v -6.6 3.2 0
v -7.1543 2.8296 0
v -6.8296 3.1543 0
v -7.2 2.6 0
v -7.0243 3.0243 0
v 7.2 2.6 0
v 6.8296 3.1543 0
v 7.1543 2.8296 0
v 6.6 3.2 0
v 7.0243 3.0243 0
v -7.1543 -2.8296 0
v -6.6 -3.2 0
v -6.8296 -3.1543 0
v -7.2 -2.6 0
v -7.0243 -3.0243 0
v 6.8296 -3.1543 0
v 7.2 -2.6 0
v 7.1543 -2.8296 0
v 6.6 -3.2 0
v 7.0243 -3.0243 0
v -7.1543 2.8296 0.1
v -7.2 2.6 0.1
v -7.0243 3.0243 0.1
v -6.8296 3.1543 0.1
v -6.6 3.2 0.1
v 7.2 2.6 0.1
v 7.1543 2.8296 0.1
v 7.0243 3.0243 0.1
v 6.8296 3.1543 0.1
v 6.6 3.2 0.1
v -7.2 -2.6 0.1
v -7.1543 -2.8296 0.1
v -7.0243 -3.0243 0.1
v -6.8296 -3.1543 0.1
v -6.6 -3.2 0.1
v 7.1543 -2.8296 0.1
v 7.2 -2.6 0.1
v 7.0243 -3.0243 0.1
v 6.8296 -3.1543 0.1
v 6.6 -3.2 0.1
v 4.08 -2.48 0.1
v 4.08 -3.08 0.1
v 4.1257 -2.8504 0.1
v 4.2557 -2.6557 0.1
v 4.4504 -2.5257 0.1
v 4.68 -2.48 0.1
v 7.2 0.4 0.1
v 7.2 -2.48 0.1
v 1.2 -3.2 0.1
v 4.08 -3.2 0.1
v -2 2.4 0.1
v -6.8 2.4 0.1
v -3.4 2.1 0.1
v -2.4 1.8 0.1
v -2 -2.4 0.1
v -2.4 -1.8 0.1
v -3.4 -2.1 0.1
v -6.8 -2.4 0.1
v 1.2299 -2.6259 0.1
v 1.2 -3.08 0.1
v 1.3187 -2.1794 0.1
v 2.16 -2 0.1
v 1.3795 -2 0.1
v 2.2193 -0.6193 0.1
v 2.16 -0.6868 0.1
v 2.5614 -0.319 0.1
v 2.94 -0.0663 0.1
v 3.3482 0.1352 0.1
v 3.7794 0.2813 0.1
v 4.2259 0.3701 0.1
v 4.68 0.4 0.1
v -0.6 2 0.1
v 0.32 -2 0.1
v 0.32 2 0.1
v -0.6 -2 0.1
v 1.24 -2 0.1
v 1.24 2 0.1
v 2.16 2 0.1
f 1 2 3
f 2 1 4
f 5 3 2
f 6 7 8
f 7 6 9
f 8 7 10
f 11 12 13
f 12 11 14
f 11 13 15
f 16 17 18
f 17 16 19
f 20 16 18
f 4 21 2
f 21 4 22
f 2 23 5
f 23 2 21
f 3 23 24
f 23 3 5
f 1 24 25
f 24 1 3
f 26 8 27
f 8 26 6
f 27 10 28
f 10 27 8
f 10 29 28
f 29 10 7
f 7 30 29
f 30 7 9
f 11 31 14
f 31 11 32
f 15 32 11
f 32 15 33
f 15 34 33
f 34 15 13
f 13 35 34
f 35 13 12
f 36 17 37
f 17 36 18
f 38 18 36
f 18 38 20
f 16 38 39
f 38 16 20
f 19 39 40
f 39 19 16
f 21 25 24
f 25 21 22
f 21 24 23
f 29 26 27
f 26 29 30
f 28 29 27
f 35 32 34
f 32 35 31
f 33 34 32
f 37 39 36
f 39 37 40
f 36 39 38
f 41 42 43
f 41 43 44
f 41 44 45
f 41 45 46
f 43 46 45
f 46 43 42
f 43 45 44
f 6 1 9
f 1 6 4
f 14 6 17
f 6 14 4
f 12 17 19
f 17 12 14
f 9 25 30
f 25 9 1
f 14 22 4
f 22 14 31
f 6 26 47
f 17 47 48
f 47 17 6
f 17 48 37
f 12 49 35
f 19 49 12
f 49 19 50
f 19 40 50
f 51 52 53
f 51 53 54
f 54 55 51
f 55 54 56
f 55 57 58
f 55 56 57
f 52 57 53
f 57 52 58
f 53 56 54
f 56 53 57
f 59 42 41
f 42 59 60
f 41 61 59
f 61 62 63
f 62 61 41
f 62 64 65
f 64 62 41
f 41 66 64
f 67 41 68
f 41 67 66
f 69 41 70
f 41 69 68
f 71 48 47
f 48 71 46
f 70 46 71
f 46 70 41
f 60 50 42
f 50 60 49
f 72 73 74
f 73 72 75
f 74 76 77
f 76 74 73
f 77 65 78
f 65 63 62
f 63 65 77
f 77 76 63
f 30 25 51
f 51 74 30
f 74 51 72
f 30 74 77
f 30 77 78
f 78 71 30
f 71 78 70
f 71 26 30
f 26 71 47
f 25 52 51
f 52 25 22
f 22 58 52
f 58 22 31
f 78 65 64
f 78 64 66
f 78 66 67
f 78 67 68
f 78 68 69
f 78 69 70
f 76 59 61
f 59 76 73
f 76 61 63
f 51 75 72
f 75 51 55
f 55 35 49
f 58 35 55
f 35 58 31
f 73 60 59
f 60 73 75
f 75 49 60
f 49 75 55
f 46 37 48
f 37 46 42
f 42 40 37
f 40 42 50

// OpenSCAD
// file: ../p/1-4ndis.scad
use <../lib.scad>
function ldraw_lib__1_4ndis() = [
// 0 Disc Negative 0.25
// 0 Name: 1-4ndis.dat
// 0 Author: James Jessiman
// 0 !LDRAW_ORG Primitive UPDATE 2012-01
// 0 !LICENSE Licensed under CC BY 4.0 : see CAreadme.txt
// 
// 0 BFC CERTIFY CCW
  [0,"BFC","CERTIFY"],
  [0,"BFC","CCW"],
// 
// 0 !HISTORY 2002-03-23 [sbliss] Added BFC Statement
// 0 !HISTORY 2002-04-25 [PTadmin] Official Update 2002-02
// 0 !HISTORY 2007-06-22 [PTadmin] Header formatted for Contributor Agreement
// 0 !HISTORY 2008-07-01 [PTadmin] Official Update 2008-01
// 0 !HISTORY 2012-02-16 [Philo] Changed to CCW
// 0 !HISTORY 2012-03-30 [PTadmin] Official Update 2012-01
// 
// 
// 3 16 0.9239 0 0.3827 1 0 0 1 0 1
  [3,16,0.9239,0,0.3827,1,0,0,1,0,1],
// 3 16 0.7071 0 0.7071 0.9239 0 0.3827 1 0 1
  [3,16,0.7071,0,0.7071,0.9239,0,0.3827,1,0,1],
// 3 16 0.3827 0 0.9239 0.7071 0 0.7071 1 0 1
  [3,16,0.3827,0,0.9239,0.7071,0,0.7071,1,0,1],
// 3 16 0 0 1 0.3827 0 0.9239 1 0 1
  [3,16,0,0,1,0.3827,0,0.9239,1,0,1],
];
module ldraw_lib__1_4ndis(step=0, col=false, unit=2/5, alt=false, line=0.2, solid=!$preview)
    makepoly(ldraw_lib__1_4ndis(), step=step, col=col, unit=unit, alt=alt, line=line, solid=solid);
ldraw_lib__1_4ndis(line=0.2);
// file: ../p/1-4cyli.scad
use <../lib.scad>
function ldraw_lib__1_4cyli() = [
// 0 Cylinder 0.25
// 0 Name: 1-4cyli.dat
// 0 Author: James Jessiman
// 0 !LDRAW_ORG Primitive UPDATE 2012-01
// 0 !LICENSE Licensed under CC BY 4.0 : see CAreadme.txt
// 
// 0 BFC CERTIFY CCW
  [0,"BFC","CERTIFY"],
  [0,"BFC","CCW"],
// 
// 0 !HISTORY 2002-03-23 [sbliss] Added BFC statement.
// 0 !HISTORY 2002-04-25 [PTadmin] Official Update 2002-02
// 0 !HISTORY 2007-06-22 [PTadmin] Header formatted for Contributor Agreement
// 0 !HISTORY 2008-07-01 [PTadmin] Official Update 2008-01
// 0 !HISTORY 2012-02-16 [Philo] Changed to CCW
// 0 !HISTORY 2012-03-30 [PTadmin] Official Update 2012-01
// 
// 
// 4 16 1 1 0 0.9239 1 0.3827 0.9239 0 0.3827 1 0 0
  [4,16,1,1,0,0.9239,1,0.3827,0.9239,0,0.3827,1,0,0],
// 5 24 1 0 0 1 1 0 0.9239 0 0.3827 1 0 -1
  [5,24,1,0,0,1,1,0,0.9239,0,0.3827,1,0,-1],
// 4 16 0.9239 1 0.3827 0.7071 1 0.7071 0.7071 0 0.7071 0.9239 0 0.3827
  [4,16,0.9239,1,0.3827,0.7071,1,0.7071,0.7071,0,0.7071,0.9239,0,0.3827],
// 5 24 0.9239 0 0.3827 0.9239 1 0.3827 0.7071 0 0.7071 1 0 0
  [5,24,0.9239,0,0.3827,0.9239,1,0.3827,0.7071,0,0.7071,1,0,0],
// 4 16 0.7071 1 0.7071 0.3827 1 0.9239 0.3827 0 0.9239 0.7071 0 0.7071
  [4,16,0.7071,1,0.7071,0.3827,1,0.9239,0.3827,0,0.9239,0.7071,0,0.7071],
// 5 24 0.7071 0 0.7071 0.7071 1 0.7071 0.3827 0 0.9239 0.9239 0 0.3827
  [5,24,0.7071,0,0.7071,0.7071,1,0.7071,0.3827,0,0.9239,0.9239,0,0.3827],
// 4 16 0.3827 1 0.9239 0 1 1 0 0 1 0.3827 0 0.9239
  [4,16,0.3827,1,0.9239,0,1,1,0,0,1,0.3827,0,0.9239],
// 5 24 0.3827 0 0.9239 0.3827 1 0.9239 0 0 1 0.7071 0 0.7071
  [5,24,0.3827,0,0.9239,0.3827,1,0.9239,0,0,1,0.7071,0,0.7071],
// 5 24 0 0 1 0 1 1 0.3827 0 0.9239 -1 0 1
  [5,24,0,0,1,0,1,1,0.3827,0,0.9239,-1,0,1],
];
module ldraw_lib__1_4cyli(step=0, col=false, unit=2/5, alt=false, line=0.2, solid=!$preview)
    makepoly(ldraw_lib__1_4cyli(), step=step, col=col, unit=unit, alt=alt, line=line, solid=solid);
ldraw_lib__1_4cyli(line=0.2);
// file: ../p/1-4chrd.scad
use <../lib.scad>
function ldraw_lib__1_4chrd() = [
// 0 Chord 0.25
// 0 Name: 1-4chrd.dat
// 0 Author: Max Martin Richter [MMR1988]
// 0 !LDRAW_ORG Primitive UPDATE 2023-05
// 0 !LICENSE Licensed under CC BY 4.0 : see CAreadme.txt
// 
// 0 BFC CERTIFY CCW
  [0,"BFC","CERTIFY"],
  [0,"BFC","CCW"],
// 
// 0 !HISTORY 2004-04-22 [PTadmin] Official Update 2004-02
// 0 !HISTORY 2007-10-09 [PTadmin] Header formatted for Contributor Agreement
// 0 !HISTORY 2008-07-01 [PTadmin] Official Update 2008-01
// 0 !HISTORY 2012-08-02 [MMR1988] Re-creation with PrimGen2 and Rectifier
// 0 !HISTORY 2012-08-09 [PTadmin] Official Update 2012-02
// 0 !HISTORY 2023-10-27 [OrionP] Change author to MMR1988 from hafhead
// 0 !HISTORY 2023-10-31 [OrionP] Official Update 2023-05
// 
// 4 16 0.9239 0 0.3827 0.3827 0 0.9239 0 0 1 1 0 0
  [4,16,0.9239,0,0.3827,0.3827,0,0.9239,0,0,1,1,0,0],
// 3 16 0.7071 0 0.7071 0.3827 0 0.9239 0.9239 0 0.3827
  [3,16,0.7071,0,0.7071,0.3827,0,0.9239,0.9239,0,0.3827],
];
module ldraw_lib__1_4chrd(step=0, col=false, unit=2/5, alt=false, line=0.2, solid=!$preview)
    makepoly(ldraw_lib__1_4chrd(), step=step, col=col, unit=unit, alt=alt, line=line, solid=solid);
ldraw_lib__1_4chrd(line=0.2);
// main file
use <../lib.scad>
use <../p/1-4chrd.scad>
use <../p/1-4cyli.scad>
use <../p/1-4ndis.scad>
function ldraw_lib__6148328bk() = [
// 0 Sticker  0.8 x  1.8 with Dark Grey Lines on White Background
// 0 Name: 6148328bk.dat
// 0 Author: Massimo Maso [Sirio]
// 0 !LDRAW_ORG Part UPDATE 2024-08
// 0 !LICENSE Licensed under CC BY 4.0 : see CAreadme.txt
// 
// 0 !HELP Needs work: halftone areas in the headlamp are simplified with dark grey faces
// 
// 0 BFC CERTIFY CCW
  [0,"BFC","CERTIFY"],
  [0,"BFC","CCW"],
// 
// 0 !KEYWORDS 919, Bricklink 75876stk01, Brickowl 852010, Hybrid, Pit Lane
// 0 !KEYWORDS Porsche, Rebrickable 26357, set 75876, Speed Champions
// 
// 0 !HISTORY 2024-09-30 [OrionP] Official Update 2024-08
// 
// 
// 0 // Primitives
// 
// 1 16 -16.5 0 6.5 -1.5 0 0 0 -1 0 0 0 1.5 1-4chrd.dat
  [1,16,-16.5,0,6.5,-1.5,0,0,0,-1,0,0,0,1.5, ldraw_lib__1_4chrd()],
// 1 16 16.5 0 6.5 1.5 0 0 0 -1 0 0 0 1.5 1-4chrd.dat
  [1,16,16.5,0,6.5,1.5,0,0,0,-1,0,0,0,1.5, ldraw_lib__1_4chrd()],
// 1 16 -16.5 0 -6.5 -1.5 0 0 0 -1 0 0 0 -1.5 1-4chrd.dat
  [1,16,-16.5,0,-6.5,-1.5,0,0,0,-1,0,0,0,-1.5, ldraw_lib__1_4chrd()],
// 1 16 16.5 0 -6.5 1.5 0 0 0 -1 0 0 0 -1.5 1-4chrd.dat
  [1,16,16.5,0,-6.5,1.5,0,0,0,-1,0,0,0,-1.5, ldraw_lib__1_4chrd()],
// 1 16 -16.5 0 6.5 -1.5 0 0 0 -.25 0 0 0 1.5 1-4cyli.dat
  [1,16,-16.5,0,6.5,-1.5,0,0,0,-.25,0,0,0,1.5, ldraw_lib__1_4cyli()],
// 1 16 16.5 0 6.5 1.5 0 0 0 -.25 0 0 0 1.5 1-4cyli.dat
  [1,16,16.5,0,6.5,1.5,0,0,0,-.25,0,0,0,1.5, ldraw_lib__1_4cyli()],
// 1 16 -16.5 0 -6.5 -1.5 0 0 0 -.25 0 0 0 -1.5 1-4cyli.dat
  [1,16,-16.5,0,-6.5,-1.5,0,0,0,-.25,0,0,0,-1.5, ldraw_lib__1_4cyli()],
// 1 16 16.5 0 -6.5 1.5 0 0 0 -.25 0 0 0 -1.5 1-4cyli.dat
  [1,16,16.5,0,-6.5,1.5,0,0,0,-.25,0,0,0,-1.5, ldraw_lib__1_4cyli()],
// 1 15 -16.5 -.25 6.5 -1.5 0 0 0 1 0 0 0 1.5 1-4chrd.dat
  [1,15,-16.5,-.25,6.5,-1.5,0,0,0,1,0,0,0,1.5, ldraw_lib__1_4chrd()],
// 1 15 16.5 -.25 6.5 1.5 0 0 0 1 0 0 0 1.5 1-4chrd.dat
  [1,15,16.5,-.25,6.5,1.5,0,0,0,1,0,0,0,1.5, ldraw_lib__1_4chrd()],
// 1 15 -16.5 -.25 -6.5 -1.5 0 0 0 1 0 0 0 -1.5 1-4chrd.dat
  [1,15,-16.5,-.25,-6.5,-1.5,0,0,0,1,0,0,0,-1.5, ldraw_lib__1_4chrd()],
// 1 15 16.5 -.25 -6.5 1.5 0 0 0 1 0 0 0 -1.5 1-4chrd.dat
  [1,15,16.5,-.25,-6.5,1.5,0,0,0,1,0,0,0,-1.5, ldraw_lib__1_4chrd()],
// 1 72 11.7 -.25 -7.7 -1.5 0 0 0 1 0 0 0 1.5 1-4ndis.dat
  [1,72,11.7,-.25,-7.7,-1.5,0,0,0,1,0,0,0,1.5, ldraw_lib__1_4ndis()],
// 1 15 11.7 -.25 -7.7 -1.5 0 0 0 1 0 0 0 1.5 1-4chrd.dat
  [1,15,11.7,-.25,-7.7,-1.5,0,0,0,1,0,0,0,1.5, ldraw_lib__1_4chrd()],
// 0 // Bottom faces
// 4 16 16.5 0 8 18 0 6.5 -18 0 6.5 -16.5 0 8
  [4,16,16.5,0,8,18,0,6.5,-18,0,6.5,-16.5,0,8],
// 4 16 18 0 6.5 18 0 -6.5 -18 0 -6.5 -18 0 6.5
  [4,16,18,0,6.5,18,0,-6.5,-18,0,-6.5,-18,0,6.5],
// 4 16 16.5 0 -8 -16.5 0 -8 -18 0 -6.5 18 0 -6.5
  [4,16,16.5,0,-8,-16.5,0,-8,-18,0,-6.5,18,0,-6.5],
// 0 // Lateral faces
// 4 16 -16.5 0 8 -16.5 -.25 8 16.5 -.25 8 16.5 0 8
  [4,16,-16.5,0,8,-16.5,-.25,8,16.5,-.25,8,16.5,0,8],
// 4 16 -18 0 6.5 -18 0 -6.5 -18 -.25 -6.5 -18 -.25 6.5
  [4,16,-18,0,6.5,-18,0,-6.5,-18,-.25,-6.5,-18,-.25,6.5],
// 3 16 18 0 6.5 18 -.25 6.5 18 -.25 1
  [3,16,18,0,6.5,18,-.25,6.5,18,-.25,1],
// 4 16 18 0 6.5 18 -.25 1 18 -.25 -6.2 18 0 -6.5
  [4,16,18,0,6.5,18,-.25,1,18,-.25,-6.2,18,0,-6.5],
// 3 16 18 0 -6.5 18 -.25 -6.2 18 -.25 -6.5
  [3,16,18,0,-6.5,18,-.25,-6.2,18,-.25,-6.5],
// 3 16 -16.5 0 -8 3 -.25 -8 -16.5 -.25 -8
  [3,16,-16.5,0,-8,3,-.25,-8,-16.5,-.25,-8],
// 4 16 -16.5 0 -8 16.5 0 -8 10.2 -.25 -8 3 -.25 -8
  [4,16,-16.5,0,-8,16.5,0,-8,10.2,-.25,-8,3,-.25,-8],
// 3 16 16.5 0 -8 16.5 -.25 -8 10.2 -.25 -8
  [3,16,16.5,0,-8,16.5,-.25,-8,10.2,-.25,-8],
// 0 // Top faces
// 0 // Black faces
// 3 0 -5 -.25 6 -17 -.25 6 -8.5 -.25 5.25
  [3,0,-5,-.25,6,-17,-.25,6,-8.5,-.25,5.25],
// 3 0 -5 -.25 6 -8.5 -.25 5.25 -6 -.25 4.5
  [3,0,-5,-.25,6,-8.5,-.25,5.25,-6,-.25,4.5],
// 4 0 -5 -.25 6 -6 -.25 4.5 -6 -.25 -4.5 -5 -.25 -6
  [4,0,-5,-.25,6,-6,-.25,4.5,-6,-.25,-4.5,-5,-.25,-6],
// 3 0 -5 -.25 -6 -8.5 -.25 -5.25 -17 -.25 -6
  [3,0,-5,-.25,-6,-8.5,-.25,-5.25,-17,-.25,-6],
// 3 0 -5 -.25 -6 -6 -.25 -4.5 -8.5 -.25 -5.25
  [3,0,-5,-.25,-6,-6,-.25,-4.5,-8.5,-.25,-5.25],
// 0 // Dark grey faces (actually halftone of ndis 15 and disc 0)
// 4 72 -8.5 -.25 5.25 -17 -.25 6 -17 -.25 -6 -8.5 -.25 -5.25
  [4,72,-8.5,-.25,5.25,-17,-.25,6,-17,-.25,-6,-8.5,-.25,-5.25],
// 4 72 -8.5 -.25 5.25 -8.5 -.25 -5.25 -6 -.25 -4.5 -6 -.25 4.5
  [4,72,-8.5,-.25,5.25,-8.5,-.25,-5.25,-6,-.25,-4.5,-6,-.25,4.5],
// 0 // Dark grey faces
// 4 72 10.2 -.25 -6.2 3.0748 -.25 -6.5647 3 -.25 -7.7 10.2 -.25 -7.7
  [4,72,10.2,-.25,-6.2,3.0748,-.25,-6.5647,3,-.25,-7.7,10.2,-.25,-7.7],
// 3 72 10.2 -.25 -6.2 3.2967 -.25 -5.4484 3.0748 -.25 -6.5647
  [3,72,10.2,-.25,-6.2,3.2967,-.25,-5.4484,3.0748,-.25,-6.5647],
// 4 72 10.2 -.25 -6.2 5.4 -.25 -5 3.4487 -.25 -5 3.2967 -.25 -5.4484
  [4,72,10.2,-.25,-6.2,5.4,-.25,-5,3.4487,-.25,-5,3.2967,-.25,-5.4484],
// 4 72 10.2 -.25 -6.2 5.5482 -.25 -1.5482 5.4 -.25 -1.7171 5.4 -.25 -5
  [4,72,10.2,-.25,-6.2,5.5482,-.25,-1.5482,5.4,-.25,-1.7171,5.4,-.25,-5],
// 3 72 10.2 -.25 -6.2 6.4034 -.25 -.7974 5.5482 -.25 -1.5482
  [3,72,10.2,-.25,-6.2,6.4034,-.25,-.7974,5.5482,-.25,-1.5482],
// 4 72 10.2 -.25 -6.2 8.3705 -.25 .3379 7.35 -.25 -.1658 6.4034 -.25 -.7974
  [4,72,10.2,-.25,-6.2,8.3705,-.25,.3379,7.35,-.25,-.1658,6.4034,-.25,-.7974],
// 4 72 10.2 -.25 -6.2 10.5647 -.25 .9252 9.4484 -.25 .7033 8.3705 -.25 .3379
  [4,72,10.2,-.25,-6.2,10.5647,-.25,.9252,9.4484,-.25,.7033,8.3705,-.25,.3379],
// 4 72 11.7 -.25 -6.2 18 -.25 -6.2 18 -.25 1 11.7 -.25 1
  [4,72,11.7,-.25,-6.2,18,-.25,-6.2,18,-.25,1,11.7,-.25,1],
// 4 72 11.7 -.25 -6.2 11.7 -.25 1 10.5647 -.25 .9252 10.2 -.25 -6.2
  [4,72,11.7,-.25,-6.2,11.7,-.25,1,10.5647,-.25,.9252,10.2,-.25,-6.2],
// 4 72 3 -.25 -7.7 3 -.25 -8 10.2 -.25 -8 10.2 -.25 -7.7
  [4,72,3,-.25,-7.7,3,-.25,-8,10.2,-.25,-8,10.2,-.25,-7.7],
// 0 // German flag
// 4 0 .8 -.25 5 -1.5 -.25 5 -1.5 -.25 -5 .8 -.25 -5
  [4,0,.8,-.25,5,-1.5,-.25,5,-1.5,-.25,-5,.8,-.25,-5],
// 4 4 .8 -.25 5 .8 -.25 -5 3.1 -.25 -5 3.1 -.25 5
  [4,4,.8,-.25,5,.8,-.25,-5,3.1,-.25,-5,3.1,-.25,5],
// 3 14 3.1 -.25 5 5.4 -.25 -1.7171 5.4 -.25 5
  [3,14,3.1,-.25,5,5.4,-.25,-1.7171,5.4,-.25,5],
// 4 14 3.1 -.25 5 3.4487 -.25 -5 5.4 -.25 -5 5.4 -.25 -1.7171
  [4,14,3.1,-.25,5,3.4487,-.25,-5,5.4,-.25,-5,5.4,-.25,-1.7171],
// 3 14 3.1 -.25 5 3.1 -.25 -5 3.4487 -.25 -5
  [3,14,3.1,-.25,5,3.1,-.25,-5,3.4487,-.25,-5],
// 0 // White faces
// 3 15 16.5 -.25 8 -16.5 -.25 8 -5 -.25 6
  [3,15,16.5,-.25,8,-16.5,-.25,8,-5,-.25,6],
// 4 15 16.5 -.25 8 -5 -.25 6 -1.5 -.25 5 .8 -.25 5
  [4,15,16.5,-.25,8,-5,-.25,6,-1.5,-.25,5,.8,-.25,5],
// 3 15 16.5 -.25 8 .8 -.25 5 3.1 -.25 5
  [3,15,16.5,-.25,8,.8,-.25,5,3.1,-.25,5],
// 3 15 16.5 -.25 8 3.1 -.25 5 5.4 -.25 5
  [3,15,16.5,-.25,8,3.1,-.25,5,5.4,-.25,5],
// 4 15 16.5 -.25 8 5.4 -.25 5 10.5647 -.25 .9252 11.7 -.25 1
  [4,15,16.5,-.25,8,5.4,-.25,5,10.5647,-.25,.9252,11.7,-.25,1],
// 4 15 16.5 -.25 8 11.7 -.25 1 18 -.25 1 18 -.25 6.5
  [4,15,16.5,-.25,8,11.7,-.25,1,18,-.25,1,18,-.25,6.5],
// 4 15 -17 -.25 6 -5 -.25 6 -16.5 -.25 8 -18 -.25 6.5
  [4,15,-17,-.25,6,-5,-.25,6,-16.5,-.25,8,-18,-.25,6.5],
// 4 15 -17 -.25 6 -18 -.25 6.5 -18 -.25 -6.5 -17 -.25 -6
  [4,15,-17,-.25,6,-18,-.25,6.5,-18,-.25,-6.5,-17,-.25,-6],
// 3 15 5.4 -.25 5 5.4 -.25 -1.7171 5.5482 -.25 -1.5482
  [3,15,5.4,-.25,5,5.4,-.25,-1.7171,5.5482,-.25,-1.5482],
// 3 15 5.4 -.25 5 5.5482 -.25 -1.5482 6.4034 -.25 -.7974
  [3,15,5.4,-.25,5,5.5482,-.25,-1.5482,6.4034,-.25,-.7974],
// 3 15 5.4 -.25 5 6.4034 -.25 -.7974 7.35 -.25 -.1658
  [3,15,5.4,-.25,5,6.4034,-.25,-.7974,7.35,-.25,-.1658],
// 3 15 5.4 -.25 5 7.35 -.25 -.1658 8.3705 -.25 .3379
  [3,15,5.4,-.25,5,7.35,-.25,-.1658,8.3705,-.25,.3379],
// 3 15 5.4 -.25 5 8.3705 -.25 .3379 9.4484 -.25 .7033
  [3,15,5.4,-.25,5,8.3705,-.25,.3379,9.4484,-.25,.7033],
// 3 15 5.4 -.25 5 9.4484 -.25 .7033 10.5647 -.25 .9252
  [3,15,5.4,-.25,5,9.4484,-.25,.7033,10.5647,-.25,.9252],
// 4 15 3.1 -.25 -5 .8 -.25 -5 3.0748 -.25 -6.5647 3.2967 -.25 -5.4484
  [4,15,3.1,-.25,-5,.8,-.25,-5,3.0748,-.25,-6.5647,3.2967,-.25,-5.4484],
// 3 15 3.1 -.25 -5 3.2967 -.25 -5.4484 3.4487 -.25 -5
  [3,15,3.1,-.25,-5,3.2967,-.25,-5.4484,3.4487,-.25,-5],
// 4 15 -5 -.25 -6 -1.5 -.25 -5 -1.5 -.25 5 -5 -.25 6
  [4,15,-5,-.25,-6,-1.5,-.25,-5,-1.5,-.25,5,-5,-.25,6],
// 3 15 -5 -.25 -6 -16.5 -.25 -8 3 -.25 -8
  [3,15,-5,-.25,-6,-16.5,-.25,-8,3,-.25,-8],
// 4 15 -5 -.25 -6 -17 -.25 -6 -18 -.25 -6.5 -16.5 -.25 -8
  [4,15,-5,-.25,-6,-17,-.25,-6,-18,-.25,-6.5,-16.5,-.25,-8],
// 4 15 3 -.25 -7.7 3.0748 -.25 -6.5647 .8 -.25 -5 -1.5 -.25 -5
  [4,15,3,-.25,-7.7,3.0748,-.25,-6.5647,.8,-.25,-5,-1.5,-.25,-5],
// 4 15 3 -.25 -7.7 -1.5 -.25 -5 -5 -.25 -6 3 -.25 -8
  [4,15,3,-.25,-7.7,-1.5,-.25,-5,-5,-.25,-6,3,-.25,-8],
// 4 15 10.2 -.25 -7.7 18 -.25 -6.5 18 -.25 -6.2 11.7 -.25 -6.2
  [4,15,10.2,-.25,-7.7,18,-.25,-6.5,18,-.25,-6.2,11.7,-.25,-6.2],
// 4 15 10.2 -.25 -7.7 10.2 -.25 -8 16.5 -.25 -8 18 -.25 -6.5
  [4,15,10.2,-.25,-7.7,10.2,-.25,-8,16.5,-.25,-8,18,-.25,-6.5],
];
module ldraw_lib__6148328bk(step=0, col=false, unit=2/5, alt=false, line=0.2, solid=!$preview)
    makepoly(ldraw_lib__6148328bk(), step=step, col=col, unit=unit, alt=alt, line=line, solid=solid);
ldraw_lib__6148328bk(line=0.2);
